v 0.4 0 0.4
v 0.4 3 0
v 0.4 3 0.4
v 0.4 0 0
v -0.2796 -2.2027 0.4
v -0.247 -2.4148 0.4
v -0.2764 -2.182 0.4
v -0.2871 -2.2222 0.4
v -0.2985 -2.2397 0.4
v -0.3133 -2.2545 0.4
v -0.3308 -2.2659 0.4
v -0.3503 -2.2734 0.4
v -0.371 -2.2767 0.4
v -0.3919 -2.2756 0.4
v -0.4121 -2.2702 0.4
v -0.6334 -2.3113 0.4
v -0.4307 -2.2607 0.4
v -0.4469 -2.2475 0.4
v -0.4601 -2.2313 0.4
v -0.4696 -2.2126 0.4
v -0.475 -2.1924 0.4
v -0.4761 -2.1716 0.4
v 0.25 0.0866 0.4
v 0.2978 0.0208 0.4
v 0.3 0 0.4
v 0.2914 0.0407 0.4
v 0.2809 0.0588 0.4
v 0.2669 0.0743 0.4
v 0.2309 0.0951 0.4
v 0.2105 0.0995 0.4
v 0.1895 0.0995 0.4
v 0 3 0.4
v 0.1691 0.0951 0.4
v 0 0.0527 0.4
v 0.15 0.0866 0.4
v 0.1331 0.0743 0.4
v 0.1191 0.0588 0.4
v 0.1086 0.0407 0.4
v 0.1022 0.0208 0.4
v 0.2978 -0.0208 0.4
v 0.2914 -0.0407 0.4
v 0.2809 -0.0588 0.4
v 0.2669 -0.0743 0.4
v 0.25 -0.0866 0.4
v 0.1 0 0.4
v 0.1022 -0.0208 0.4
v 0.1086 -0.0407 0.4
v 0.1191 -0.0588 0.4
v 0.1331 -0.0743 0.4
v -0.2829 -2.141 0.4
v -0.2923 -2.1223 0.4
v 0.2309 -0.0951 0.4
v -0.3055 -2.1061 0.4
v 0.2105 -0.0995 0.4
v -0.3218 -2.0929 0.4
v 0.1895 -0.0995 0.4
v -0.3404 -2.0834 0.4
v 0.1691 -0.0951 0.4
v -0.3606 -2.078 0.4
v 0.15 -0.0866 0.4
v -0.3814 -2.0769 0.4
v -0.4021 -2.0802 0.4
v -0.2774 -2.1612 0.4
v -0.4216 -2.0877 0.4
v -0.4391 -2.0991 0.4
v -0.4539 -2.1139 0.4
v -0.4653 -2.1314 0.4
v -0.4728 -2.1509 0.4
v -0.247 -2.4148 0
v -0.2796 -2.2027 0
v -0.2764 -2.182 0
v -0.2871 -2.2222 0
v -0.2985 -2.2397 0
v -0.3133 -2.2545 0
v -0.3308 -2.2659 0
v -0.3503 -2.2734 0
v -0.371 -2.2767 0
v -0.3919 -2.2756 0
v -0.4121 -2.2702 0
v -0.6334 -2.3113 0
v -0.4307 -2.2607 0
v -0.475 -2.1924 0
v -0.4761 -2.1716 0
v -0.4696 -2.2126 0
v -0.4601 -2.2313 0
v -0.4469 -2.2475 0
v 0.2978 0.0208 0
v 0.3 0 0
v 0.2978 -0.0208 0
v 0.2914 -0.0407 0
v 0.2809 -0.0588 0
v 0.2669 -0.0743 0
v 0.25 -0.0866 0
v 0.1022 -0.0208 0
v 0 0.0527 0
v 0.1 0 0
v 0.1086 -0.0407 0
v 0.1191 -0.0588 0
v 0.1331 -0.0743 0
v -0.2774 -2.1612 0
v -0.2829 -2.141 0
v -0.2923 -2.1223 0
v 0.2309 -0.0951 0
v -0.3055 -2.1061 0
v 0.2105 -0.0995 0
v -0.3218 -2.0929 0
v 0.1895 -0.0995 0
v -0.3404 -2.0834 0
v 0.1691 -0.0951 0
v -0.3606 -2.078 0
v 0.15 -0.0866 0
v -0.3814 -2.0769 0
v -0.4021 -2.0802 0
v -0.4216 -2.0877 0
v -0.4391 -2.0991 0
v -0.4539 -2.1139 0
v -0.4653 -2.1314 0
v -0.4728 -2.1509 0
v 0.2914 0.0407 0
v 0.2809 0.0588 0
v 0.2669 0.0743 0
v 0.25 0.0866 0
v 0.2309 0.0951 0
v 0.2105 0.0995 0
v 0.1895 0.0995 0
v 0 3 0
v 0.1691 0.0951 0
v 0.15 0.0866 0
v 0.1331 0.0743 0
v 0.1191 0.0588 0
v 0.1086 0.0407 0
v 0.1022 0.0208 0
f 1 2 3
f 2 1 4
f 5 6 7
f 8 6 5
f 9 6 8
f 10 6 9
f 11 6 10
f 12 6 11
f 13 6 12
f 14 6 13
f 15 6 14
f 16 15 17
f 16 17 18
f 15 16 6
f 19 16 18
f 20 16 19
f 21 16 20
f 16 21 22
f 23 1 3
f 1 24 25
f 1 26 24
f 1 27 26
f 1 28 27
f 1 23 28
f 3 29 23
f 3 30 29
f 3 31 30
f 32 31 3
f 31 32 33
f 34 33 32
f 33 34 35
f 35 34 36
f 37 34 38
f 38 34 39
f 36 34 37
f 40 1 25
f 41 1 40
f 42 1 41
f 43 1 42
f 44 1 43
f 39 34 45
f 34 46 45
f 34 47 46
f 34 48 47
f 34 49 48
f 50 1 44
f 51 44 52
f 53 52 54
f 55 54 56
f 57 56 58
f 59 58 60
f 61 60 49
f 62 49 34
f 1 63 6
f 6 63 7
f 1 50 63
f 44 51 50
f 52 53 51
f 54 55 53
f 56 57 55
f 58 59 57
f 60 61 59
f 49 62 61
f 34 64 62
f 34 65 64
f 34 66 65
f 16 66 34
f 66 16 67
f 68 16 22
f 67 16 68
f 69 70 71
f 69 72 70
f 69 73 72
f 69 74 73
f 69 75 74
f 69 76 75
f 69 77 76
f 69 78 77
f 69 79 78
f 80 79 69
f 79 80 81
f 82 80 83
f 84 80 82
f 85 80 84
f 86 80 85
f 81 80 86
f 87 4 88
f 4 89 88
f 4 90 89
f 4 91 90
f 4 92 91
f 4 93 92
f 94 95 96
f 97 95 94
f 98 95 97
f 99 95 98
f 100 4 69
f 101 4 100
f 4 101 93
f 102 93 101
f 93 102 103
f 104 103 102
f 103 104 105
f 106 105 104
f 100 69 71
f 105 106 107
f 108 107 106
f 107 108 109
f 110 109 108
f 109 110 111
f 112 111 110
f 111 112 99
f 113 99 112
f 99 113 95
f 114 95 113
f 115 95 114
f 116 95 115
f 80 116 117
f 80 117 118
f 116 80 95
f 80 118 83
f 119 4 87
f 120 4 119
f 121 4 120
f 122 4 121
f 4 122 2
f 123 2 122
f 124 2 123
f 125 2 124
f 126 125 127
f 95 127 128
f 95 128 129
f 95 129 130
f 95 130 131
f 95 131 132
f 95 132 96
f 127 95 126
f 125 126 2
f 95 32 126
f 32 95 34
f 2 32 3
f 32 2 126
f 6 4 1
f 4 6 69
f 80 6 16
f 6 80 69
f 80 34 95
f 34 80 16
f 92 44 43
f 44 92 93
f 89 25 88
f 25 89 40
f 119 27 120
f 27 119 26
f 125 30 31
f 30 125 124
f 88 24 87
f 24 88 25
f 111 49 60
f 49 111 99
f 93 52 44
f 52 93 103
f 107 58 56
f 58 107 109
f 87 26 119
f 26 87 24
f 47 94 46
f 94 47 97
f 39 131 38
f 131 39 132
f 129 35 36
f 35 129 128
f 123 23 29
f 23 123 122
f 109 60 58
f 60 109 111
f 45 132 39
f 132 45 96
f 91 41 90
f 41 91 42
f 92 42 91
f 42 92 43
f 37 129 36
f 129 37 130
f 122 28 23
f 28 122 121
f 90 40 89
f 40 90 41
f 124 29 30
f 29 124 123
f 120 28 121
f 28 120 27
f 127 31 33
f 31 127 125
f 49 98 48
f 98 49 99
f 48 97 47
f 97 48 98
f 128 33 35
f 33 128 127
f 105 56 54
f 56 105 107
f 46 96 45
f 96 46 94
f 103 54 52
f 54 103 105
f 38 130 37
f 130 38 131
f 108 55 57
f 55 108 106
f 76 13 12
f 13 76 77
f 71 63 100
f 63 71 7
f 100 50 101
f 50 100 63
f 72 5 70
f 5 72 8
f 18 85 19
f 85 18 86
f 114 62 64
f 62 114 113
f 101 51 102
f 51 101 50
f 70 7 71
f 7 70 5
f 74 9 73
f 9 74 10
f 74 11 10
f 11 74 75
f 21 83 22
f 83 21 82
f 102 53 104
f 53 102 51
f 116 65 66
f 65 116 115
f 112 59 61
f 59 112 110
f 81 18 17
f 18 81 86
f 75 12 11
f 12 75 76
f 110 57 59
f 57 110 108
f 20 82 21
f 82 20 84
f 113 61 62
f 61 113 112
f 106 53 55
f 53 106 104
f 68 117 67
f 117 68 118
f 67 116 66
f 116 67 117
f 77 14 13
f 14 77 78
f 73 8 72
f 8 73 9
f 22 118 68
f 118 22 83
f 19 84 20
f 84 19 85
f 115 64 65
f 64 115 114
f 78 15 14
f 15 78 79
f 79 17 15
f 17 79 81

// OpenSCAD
$fn = 30;
difference() {
	union() {
		cube([0.4, 3.0, 0.4]);
		translate([0.4, 0, 0]) rotate([0,0,165]) cube([0.4, 2.5, 0.4]);
	}
	translate([0.2, 0, 0]) cylinder(r=0.1, h = 3, center=true);
	rotate([0,0,165-180]) translate([0.2,-2.2,0]) cylinder(r=0.1, h = 3, center=true);
}
